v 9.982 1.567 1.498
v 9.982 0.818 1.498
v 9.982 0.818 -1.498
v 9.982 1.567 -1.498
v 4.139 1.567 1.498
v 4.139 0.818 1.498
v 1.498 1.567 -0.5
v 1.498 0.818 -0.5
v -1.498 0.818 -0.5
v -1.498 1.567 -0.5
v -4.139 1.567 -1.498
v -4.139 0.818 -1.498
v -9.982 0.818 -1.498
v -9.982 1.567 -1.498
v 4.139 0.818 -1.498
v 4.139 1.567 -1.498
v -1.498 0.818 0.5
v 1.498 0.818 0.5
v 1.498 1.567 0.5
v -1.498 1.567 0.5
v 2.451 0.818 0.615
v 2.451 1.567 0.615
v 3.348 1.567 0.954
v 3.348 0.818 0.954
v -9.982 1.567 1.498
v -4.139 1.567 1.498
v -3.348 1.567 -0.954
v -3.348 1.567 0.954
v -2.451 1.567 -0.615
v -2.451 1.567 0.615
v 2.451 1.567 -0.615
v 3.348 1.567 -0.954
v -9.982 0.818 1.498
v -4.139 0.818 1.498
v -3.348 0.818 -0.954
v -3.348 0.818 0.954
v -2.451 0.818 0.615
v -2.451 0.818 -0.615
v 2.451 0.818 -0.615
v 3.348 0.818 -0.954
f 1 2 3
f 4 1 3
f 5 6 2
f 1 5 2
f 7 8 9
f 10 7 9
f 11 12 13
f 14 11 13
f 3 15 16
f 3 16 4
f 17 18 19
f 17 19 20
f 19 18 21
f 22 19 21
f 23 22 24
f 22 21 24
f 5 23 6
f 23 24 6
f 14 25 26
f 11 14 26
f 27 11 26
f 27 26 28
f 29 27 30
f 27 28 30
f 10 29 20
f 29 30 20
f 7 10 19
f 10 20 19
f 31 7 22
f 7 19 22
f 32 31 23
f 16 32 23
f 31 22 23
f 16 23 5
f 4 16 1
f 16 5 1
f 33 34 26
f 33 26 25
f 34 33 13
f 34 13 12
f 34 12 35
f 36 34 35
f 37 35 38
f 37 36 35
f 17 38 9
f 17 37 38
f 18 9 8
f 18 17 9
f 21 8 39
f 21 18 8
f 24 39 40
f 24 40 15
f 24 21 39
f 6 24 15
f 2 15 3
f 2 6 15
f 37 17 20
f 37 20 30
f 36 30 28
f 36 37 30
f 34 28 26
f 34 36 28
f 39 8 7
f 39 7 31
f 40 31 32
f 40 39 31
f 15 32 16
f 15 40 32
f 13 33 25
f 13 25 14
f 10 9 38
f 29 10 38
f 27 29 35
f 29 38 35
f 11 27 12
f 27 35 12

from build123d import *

# Parameters (mm, degrees)
BOSS_EXTRUDE1_DEPTH                      = 2.385
MIRROR1_AT_THE_SECOND_PLANE_COPY_1_DEPTH = 2.385
SCALE1_SCALE                             = 0.3144


with BuildPart() as part:
    # Sketch1 → Boss-Extrude1 (new body)
    with BuildSketch(Plane(origin=(0, 0, 0), x_dir=(1, 0, 0), z_dir=(0, 1, 0))):
        with BuildLine():
            Line((0, 1.59), (4.765, 1.59))
            ThreePointArc((4.765, 1.59), (9.255128061, 2.410237797), (13.165260413, 4.765))
            Line((13.165260413, 4.765), (31.75, 4.765))
            Line((31.75, 4.765), (31.75, 0))
            Line((31.75, 0), (0, 0))
            Line((0, 0), (0, 1.59))
        make_face()
    boss_extrude1 = extrude(amount=BOSS_EXTRUDE1_DEPTH)



with BuildPart() as mirror1_1:
    # Mirror1: Boss-Extrude1 across plane
    add(boss_extrude1.mirror(Plane(origin=(0, 0, 0), x_dir=(0, 0, 1), z_dir=(1, 0, 0))))


with BuildPart() as part_1:
    add(part.part)

    add(mirror1_1.part)  # Mirror1 at the second plane merges Mirror1_1
    # Mirror1 at the second plane: Boss-Extrude1 across plane
    add(boss_extrude1.mirror(Plane.XY))

    # Mirror1 at the second plane copy 1 sketc → Mirror1 at the second plane copy 1 (add)
    with BuildSketch(Plane(origin=(0, 0, 0), x_dir=(-1, 0, 0), z_dir=(0, 1, 0))):
        with BuildLine():
            Line((0, 1.59), (4.765, 1.59))
            ThreePointArc((4.765, 1.59), (9.255128061, 2.410237797), (13.165260413, 4.765))
            Line((13.165260413, 4.765), (31.75, 4.765))
            Line((31.75, 4.765), (31.75, 0))
            Line((31.75, 0), (0, 0))
            Line((0, 0), (0, 1.59))
        make_face()
    extrude(amount=MIRROR1_AT_THE_SECOND_PLANE_COPY_1_DEPTH)


with BuildPart() as part_2:
    # Scale1: scaled about (0, 1.1925, 0)
    add(part_1.part.scale(SCALE1_SCALE).moved(Location((0, 0.817578, 0))))


solid = part_2.part
